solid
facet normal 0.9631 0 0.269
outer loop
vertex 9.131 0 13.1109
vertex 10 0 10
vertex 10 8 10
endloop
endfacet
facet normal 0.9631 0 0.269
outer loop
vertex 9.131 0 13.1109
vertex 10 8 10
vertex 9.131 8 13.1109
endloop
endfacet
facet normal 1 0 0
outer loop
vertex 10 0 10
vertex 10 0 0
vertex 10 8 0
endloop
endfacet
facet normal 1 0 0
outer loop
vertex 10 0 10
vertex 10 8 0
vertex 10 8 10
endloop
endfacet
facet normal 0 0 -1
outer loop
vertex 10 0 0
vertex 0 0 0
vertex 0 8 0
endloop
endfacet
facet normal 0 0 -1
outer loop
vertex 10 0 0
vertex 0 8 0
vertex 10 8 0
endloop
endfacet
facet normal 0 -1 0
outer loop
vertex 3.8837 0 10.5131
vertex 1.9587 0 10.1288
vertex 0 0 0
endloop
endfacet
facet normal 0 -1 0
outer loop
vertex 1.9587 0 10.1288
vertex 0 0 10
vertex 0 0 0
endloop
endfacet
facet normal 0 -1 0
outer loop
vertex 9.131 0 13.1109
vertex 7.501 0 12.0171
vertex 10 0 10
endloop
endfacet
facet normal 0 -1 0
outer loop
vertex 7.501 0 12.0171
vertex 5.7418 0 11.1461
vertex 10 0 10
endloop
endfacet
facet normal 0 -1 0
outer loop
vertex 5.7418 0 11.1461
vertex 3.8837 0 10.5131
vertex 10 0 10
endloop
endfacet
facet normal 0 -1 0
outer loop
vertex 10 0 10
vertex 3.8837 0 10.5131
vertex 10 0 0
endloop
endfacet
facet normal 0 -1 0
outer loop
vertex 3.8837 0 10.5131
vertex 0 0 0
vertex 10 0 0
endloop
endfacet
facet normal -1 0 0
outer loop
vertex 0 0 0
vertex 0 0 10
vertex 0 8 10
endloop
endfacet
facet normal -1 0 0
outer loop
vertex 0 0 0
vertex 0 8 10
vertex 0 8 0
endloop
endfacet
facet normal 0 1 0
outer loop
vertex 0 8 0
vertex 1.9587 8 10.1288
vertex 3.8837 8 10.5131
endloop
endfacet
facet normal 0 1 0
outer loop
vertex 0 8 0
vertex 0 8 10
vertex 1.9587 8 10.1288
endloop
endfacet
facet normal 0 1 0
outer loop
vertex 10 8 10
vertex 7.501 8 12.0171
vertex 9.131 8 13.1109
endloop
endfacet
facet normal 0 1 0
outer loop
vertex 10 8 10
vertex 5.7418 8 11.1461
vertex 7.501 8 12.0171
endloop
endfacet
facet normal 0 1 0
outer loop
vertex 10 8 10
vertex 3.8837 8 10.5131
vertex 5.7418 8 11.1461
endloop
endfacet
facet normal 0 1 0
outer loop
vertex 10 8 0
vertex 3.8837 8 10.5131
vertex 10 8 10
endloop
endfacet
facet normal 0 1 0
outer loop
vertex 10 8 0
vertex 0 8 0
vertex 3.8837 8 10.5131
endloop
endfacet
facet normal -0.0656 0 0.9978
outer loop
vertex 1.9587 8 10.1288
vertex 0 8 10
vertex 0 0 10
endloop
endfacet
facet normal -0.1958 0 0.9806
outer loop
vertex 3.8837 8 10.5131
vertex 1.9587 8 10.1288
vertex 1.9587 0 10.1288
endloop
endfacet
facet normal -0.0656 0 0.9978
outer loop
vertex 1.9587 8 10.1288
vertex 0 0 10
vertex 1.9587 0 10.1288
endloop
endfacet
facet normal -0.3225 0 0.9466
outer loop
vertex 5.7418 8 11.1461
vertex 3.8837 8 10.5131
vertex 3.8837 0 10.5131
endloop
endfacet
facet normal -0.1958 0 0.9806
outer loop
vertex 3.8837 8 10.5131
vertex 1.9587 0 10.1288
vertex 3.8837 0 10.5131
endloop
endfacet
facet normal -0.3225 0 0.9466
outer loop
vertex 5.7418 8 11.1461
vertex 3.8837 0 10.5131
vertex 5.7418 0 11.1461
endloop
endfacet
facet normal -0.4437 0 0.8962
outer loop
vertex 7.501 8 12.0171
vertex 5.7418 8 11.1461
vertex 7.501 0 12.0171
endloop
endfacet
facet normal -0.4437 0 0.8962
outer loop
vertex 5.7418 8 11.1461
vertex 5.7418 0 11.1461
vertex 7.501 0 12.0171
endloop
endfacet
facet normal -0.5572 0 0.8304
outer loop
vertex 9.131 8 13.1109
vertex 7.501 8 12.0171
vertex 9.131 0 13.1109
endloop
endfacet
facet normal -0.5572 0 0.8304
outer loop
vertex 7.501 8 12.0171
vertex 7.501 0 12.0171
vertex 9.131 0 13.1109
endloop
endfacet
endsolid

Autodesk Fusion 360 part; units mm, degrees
sketch "Sketch1" plane through (0, 0, 0) normal (0, 1, 0) x (1, 0, 0)
  line L0 (0, 0) -> (10, 0)
  line L1 (10, 0) -> (10, -10)
  line L2 (0, -10) -> (0, 0)
  line L3 (10, -10) -> (9.131, -13.1109)
  arc A0 (9.131, -13.1109) -> (0, -10) centre (0, -24.956) ccw
  dimension "d1" = 10
  dimension "d2" = 10
  dimension "d3" = 3.23
extrude "Extrude1" add sketch "Sketch1" along normal blind 8
